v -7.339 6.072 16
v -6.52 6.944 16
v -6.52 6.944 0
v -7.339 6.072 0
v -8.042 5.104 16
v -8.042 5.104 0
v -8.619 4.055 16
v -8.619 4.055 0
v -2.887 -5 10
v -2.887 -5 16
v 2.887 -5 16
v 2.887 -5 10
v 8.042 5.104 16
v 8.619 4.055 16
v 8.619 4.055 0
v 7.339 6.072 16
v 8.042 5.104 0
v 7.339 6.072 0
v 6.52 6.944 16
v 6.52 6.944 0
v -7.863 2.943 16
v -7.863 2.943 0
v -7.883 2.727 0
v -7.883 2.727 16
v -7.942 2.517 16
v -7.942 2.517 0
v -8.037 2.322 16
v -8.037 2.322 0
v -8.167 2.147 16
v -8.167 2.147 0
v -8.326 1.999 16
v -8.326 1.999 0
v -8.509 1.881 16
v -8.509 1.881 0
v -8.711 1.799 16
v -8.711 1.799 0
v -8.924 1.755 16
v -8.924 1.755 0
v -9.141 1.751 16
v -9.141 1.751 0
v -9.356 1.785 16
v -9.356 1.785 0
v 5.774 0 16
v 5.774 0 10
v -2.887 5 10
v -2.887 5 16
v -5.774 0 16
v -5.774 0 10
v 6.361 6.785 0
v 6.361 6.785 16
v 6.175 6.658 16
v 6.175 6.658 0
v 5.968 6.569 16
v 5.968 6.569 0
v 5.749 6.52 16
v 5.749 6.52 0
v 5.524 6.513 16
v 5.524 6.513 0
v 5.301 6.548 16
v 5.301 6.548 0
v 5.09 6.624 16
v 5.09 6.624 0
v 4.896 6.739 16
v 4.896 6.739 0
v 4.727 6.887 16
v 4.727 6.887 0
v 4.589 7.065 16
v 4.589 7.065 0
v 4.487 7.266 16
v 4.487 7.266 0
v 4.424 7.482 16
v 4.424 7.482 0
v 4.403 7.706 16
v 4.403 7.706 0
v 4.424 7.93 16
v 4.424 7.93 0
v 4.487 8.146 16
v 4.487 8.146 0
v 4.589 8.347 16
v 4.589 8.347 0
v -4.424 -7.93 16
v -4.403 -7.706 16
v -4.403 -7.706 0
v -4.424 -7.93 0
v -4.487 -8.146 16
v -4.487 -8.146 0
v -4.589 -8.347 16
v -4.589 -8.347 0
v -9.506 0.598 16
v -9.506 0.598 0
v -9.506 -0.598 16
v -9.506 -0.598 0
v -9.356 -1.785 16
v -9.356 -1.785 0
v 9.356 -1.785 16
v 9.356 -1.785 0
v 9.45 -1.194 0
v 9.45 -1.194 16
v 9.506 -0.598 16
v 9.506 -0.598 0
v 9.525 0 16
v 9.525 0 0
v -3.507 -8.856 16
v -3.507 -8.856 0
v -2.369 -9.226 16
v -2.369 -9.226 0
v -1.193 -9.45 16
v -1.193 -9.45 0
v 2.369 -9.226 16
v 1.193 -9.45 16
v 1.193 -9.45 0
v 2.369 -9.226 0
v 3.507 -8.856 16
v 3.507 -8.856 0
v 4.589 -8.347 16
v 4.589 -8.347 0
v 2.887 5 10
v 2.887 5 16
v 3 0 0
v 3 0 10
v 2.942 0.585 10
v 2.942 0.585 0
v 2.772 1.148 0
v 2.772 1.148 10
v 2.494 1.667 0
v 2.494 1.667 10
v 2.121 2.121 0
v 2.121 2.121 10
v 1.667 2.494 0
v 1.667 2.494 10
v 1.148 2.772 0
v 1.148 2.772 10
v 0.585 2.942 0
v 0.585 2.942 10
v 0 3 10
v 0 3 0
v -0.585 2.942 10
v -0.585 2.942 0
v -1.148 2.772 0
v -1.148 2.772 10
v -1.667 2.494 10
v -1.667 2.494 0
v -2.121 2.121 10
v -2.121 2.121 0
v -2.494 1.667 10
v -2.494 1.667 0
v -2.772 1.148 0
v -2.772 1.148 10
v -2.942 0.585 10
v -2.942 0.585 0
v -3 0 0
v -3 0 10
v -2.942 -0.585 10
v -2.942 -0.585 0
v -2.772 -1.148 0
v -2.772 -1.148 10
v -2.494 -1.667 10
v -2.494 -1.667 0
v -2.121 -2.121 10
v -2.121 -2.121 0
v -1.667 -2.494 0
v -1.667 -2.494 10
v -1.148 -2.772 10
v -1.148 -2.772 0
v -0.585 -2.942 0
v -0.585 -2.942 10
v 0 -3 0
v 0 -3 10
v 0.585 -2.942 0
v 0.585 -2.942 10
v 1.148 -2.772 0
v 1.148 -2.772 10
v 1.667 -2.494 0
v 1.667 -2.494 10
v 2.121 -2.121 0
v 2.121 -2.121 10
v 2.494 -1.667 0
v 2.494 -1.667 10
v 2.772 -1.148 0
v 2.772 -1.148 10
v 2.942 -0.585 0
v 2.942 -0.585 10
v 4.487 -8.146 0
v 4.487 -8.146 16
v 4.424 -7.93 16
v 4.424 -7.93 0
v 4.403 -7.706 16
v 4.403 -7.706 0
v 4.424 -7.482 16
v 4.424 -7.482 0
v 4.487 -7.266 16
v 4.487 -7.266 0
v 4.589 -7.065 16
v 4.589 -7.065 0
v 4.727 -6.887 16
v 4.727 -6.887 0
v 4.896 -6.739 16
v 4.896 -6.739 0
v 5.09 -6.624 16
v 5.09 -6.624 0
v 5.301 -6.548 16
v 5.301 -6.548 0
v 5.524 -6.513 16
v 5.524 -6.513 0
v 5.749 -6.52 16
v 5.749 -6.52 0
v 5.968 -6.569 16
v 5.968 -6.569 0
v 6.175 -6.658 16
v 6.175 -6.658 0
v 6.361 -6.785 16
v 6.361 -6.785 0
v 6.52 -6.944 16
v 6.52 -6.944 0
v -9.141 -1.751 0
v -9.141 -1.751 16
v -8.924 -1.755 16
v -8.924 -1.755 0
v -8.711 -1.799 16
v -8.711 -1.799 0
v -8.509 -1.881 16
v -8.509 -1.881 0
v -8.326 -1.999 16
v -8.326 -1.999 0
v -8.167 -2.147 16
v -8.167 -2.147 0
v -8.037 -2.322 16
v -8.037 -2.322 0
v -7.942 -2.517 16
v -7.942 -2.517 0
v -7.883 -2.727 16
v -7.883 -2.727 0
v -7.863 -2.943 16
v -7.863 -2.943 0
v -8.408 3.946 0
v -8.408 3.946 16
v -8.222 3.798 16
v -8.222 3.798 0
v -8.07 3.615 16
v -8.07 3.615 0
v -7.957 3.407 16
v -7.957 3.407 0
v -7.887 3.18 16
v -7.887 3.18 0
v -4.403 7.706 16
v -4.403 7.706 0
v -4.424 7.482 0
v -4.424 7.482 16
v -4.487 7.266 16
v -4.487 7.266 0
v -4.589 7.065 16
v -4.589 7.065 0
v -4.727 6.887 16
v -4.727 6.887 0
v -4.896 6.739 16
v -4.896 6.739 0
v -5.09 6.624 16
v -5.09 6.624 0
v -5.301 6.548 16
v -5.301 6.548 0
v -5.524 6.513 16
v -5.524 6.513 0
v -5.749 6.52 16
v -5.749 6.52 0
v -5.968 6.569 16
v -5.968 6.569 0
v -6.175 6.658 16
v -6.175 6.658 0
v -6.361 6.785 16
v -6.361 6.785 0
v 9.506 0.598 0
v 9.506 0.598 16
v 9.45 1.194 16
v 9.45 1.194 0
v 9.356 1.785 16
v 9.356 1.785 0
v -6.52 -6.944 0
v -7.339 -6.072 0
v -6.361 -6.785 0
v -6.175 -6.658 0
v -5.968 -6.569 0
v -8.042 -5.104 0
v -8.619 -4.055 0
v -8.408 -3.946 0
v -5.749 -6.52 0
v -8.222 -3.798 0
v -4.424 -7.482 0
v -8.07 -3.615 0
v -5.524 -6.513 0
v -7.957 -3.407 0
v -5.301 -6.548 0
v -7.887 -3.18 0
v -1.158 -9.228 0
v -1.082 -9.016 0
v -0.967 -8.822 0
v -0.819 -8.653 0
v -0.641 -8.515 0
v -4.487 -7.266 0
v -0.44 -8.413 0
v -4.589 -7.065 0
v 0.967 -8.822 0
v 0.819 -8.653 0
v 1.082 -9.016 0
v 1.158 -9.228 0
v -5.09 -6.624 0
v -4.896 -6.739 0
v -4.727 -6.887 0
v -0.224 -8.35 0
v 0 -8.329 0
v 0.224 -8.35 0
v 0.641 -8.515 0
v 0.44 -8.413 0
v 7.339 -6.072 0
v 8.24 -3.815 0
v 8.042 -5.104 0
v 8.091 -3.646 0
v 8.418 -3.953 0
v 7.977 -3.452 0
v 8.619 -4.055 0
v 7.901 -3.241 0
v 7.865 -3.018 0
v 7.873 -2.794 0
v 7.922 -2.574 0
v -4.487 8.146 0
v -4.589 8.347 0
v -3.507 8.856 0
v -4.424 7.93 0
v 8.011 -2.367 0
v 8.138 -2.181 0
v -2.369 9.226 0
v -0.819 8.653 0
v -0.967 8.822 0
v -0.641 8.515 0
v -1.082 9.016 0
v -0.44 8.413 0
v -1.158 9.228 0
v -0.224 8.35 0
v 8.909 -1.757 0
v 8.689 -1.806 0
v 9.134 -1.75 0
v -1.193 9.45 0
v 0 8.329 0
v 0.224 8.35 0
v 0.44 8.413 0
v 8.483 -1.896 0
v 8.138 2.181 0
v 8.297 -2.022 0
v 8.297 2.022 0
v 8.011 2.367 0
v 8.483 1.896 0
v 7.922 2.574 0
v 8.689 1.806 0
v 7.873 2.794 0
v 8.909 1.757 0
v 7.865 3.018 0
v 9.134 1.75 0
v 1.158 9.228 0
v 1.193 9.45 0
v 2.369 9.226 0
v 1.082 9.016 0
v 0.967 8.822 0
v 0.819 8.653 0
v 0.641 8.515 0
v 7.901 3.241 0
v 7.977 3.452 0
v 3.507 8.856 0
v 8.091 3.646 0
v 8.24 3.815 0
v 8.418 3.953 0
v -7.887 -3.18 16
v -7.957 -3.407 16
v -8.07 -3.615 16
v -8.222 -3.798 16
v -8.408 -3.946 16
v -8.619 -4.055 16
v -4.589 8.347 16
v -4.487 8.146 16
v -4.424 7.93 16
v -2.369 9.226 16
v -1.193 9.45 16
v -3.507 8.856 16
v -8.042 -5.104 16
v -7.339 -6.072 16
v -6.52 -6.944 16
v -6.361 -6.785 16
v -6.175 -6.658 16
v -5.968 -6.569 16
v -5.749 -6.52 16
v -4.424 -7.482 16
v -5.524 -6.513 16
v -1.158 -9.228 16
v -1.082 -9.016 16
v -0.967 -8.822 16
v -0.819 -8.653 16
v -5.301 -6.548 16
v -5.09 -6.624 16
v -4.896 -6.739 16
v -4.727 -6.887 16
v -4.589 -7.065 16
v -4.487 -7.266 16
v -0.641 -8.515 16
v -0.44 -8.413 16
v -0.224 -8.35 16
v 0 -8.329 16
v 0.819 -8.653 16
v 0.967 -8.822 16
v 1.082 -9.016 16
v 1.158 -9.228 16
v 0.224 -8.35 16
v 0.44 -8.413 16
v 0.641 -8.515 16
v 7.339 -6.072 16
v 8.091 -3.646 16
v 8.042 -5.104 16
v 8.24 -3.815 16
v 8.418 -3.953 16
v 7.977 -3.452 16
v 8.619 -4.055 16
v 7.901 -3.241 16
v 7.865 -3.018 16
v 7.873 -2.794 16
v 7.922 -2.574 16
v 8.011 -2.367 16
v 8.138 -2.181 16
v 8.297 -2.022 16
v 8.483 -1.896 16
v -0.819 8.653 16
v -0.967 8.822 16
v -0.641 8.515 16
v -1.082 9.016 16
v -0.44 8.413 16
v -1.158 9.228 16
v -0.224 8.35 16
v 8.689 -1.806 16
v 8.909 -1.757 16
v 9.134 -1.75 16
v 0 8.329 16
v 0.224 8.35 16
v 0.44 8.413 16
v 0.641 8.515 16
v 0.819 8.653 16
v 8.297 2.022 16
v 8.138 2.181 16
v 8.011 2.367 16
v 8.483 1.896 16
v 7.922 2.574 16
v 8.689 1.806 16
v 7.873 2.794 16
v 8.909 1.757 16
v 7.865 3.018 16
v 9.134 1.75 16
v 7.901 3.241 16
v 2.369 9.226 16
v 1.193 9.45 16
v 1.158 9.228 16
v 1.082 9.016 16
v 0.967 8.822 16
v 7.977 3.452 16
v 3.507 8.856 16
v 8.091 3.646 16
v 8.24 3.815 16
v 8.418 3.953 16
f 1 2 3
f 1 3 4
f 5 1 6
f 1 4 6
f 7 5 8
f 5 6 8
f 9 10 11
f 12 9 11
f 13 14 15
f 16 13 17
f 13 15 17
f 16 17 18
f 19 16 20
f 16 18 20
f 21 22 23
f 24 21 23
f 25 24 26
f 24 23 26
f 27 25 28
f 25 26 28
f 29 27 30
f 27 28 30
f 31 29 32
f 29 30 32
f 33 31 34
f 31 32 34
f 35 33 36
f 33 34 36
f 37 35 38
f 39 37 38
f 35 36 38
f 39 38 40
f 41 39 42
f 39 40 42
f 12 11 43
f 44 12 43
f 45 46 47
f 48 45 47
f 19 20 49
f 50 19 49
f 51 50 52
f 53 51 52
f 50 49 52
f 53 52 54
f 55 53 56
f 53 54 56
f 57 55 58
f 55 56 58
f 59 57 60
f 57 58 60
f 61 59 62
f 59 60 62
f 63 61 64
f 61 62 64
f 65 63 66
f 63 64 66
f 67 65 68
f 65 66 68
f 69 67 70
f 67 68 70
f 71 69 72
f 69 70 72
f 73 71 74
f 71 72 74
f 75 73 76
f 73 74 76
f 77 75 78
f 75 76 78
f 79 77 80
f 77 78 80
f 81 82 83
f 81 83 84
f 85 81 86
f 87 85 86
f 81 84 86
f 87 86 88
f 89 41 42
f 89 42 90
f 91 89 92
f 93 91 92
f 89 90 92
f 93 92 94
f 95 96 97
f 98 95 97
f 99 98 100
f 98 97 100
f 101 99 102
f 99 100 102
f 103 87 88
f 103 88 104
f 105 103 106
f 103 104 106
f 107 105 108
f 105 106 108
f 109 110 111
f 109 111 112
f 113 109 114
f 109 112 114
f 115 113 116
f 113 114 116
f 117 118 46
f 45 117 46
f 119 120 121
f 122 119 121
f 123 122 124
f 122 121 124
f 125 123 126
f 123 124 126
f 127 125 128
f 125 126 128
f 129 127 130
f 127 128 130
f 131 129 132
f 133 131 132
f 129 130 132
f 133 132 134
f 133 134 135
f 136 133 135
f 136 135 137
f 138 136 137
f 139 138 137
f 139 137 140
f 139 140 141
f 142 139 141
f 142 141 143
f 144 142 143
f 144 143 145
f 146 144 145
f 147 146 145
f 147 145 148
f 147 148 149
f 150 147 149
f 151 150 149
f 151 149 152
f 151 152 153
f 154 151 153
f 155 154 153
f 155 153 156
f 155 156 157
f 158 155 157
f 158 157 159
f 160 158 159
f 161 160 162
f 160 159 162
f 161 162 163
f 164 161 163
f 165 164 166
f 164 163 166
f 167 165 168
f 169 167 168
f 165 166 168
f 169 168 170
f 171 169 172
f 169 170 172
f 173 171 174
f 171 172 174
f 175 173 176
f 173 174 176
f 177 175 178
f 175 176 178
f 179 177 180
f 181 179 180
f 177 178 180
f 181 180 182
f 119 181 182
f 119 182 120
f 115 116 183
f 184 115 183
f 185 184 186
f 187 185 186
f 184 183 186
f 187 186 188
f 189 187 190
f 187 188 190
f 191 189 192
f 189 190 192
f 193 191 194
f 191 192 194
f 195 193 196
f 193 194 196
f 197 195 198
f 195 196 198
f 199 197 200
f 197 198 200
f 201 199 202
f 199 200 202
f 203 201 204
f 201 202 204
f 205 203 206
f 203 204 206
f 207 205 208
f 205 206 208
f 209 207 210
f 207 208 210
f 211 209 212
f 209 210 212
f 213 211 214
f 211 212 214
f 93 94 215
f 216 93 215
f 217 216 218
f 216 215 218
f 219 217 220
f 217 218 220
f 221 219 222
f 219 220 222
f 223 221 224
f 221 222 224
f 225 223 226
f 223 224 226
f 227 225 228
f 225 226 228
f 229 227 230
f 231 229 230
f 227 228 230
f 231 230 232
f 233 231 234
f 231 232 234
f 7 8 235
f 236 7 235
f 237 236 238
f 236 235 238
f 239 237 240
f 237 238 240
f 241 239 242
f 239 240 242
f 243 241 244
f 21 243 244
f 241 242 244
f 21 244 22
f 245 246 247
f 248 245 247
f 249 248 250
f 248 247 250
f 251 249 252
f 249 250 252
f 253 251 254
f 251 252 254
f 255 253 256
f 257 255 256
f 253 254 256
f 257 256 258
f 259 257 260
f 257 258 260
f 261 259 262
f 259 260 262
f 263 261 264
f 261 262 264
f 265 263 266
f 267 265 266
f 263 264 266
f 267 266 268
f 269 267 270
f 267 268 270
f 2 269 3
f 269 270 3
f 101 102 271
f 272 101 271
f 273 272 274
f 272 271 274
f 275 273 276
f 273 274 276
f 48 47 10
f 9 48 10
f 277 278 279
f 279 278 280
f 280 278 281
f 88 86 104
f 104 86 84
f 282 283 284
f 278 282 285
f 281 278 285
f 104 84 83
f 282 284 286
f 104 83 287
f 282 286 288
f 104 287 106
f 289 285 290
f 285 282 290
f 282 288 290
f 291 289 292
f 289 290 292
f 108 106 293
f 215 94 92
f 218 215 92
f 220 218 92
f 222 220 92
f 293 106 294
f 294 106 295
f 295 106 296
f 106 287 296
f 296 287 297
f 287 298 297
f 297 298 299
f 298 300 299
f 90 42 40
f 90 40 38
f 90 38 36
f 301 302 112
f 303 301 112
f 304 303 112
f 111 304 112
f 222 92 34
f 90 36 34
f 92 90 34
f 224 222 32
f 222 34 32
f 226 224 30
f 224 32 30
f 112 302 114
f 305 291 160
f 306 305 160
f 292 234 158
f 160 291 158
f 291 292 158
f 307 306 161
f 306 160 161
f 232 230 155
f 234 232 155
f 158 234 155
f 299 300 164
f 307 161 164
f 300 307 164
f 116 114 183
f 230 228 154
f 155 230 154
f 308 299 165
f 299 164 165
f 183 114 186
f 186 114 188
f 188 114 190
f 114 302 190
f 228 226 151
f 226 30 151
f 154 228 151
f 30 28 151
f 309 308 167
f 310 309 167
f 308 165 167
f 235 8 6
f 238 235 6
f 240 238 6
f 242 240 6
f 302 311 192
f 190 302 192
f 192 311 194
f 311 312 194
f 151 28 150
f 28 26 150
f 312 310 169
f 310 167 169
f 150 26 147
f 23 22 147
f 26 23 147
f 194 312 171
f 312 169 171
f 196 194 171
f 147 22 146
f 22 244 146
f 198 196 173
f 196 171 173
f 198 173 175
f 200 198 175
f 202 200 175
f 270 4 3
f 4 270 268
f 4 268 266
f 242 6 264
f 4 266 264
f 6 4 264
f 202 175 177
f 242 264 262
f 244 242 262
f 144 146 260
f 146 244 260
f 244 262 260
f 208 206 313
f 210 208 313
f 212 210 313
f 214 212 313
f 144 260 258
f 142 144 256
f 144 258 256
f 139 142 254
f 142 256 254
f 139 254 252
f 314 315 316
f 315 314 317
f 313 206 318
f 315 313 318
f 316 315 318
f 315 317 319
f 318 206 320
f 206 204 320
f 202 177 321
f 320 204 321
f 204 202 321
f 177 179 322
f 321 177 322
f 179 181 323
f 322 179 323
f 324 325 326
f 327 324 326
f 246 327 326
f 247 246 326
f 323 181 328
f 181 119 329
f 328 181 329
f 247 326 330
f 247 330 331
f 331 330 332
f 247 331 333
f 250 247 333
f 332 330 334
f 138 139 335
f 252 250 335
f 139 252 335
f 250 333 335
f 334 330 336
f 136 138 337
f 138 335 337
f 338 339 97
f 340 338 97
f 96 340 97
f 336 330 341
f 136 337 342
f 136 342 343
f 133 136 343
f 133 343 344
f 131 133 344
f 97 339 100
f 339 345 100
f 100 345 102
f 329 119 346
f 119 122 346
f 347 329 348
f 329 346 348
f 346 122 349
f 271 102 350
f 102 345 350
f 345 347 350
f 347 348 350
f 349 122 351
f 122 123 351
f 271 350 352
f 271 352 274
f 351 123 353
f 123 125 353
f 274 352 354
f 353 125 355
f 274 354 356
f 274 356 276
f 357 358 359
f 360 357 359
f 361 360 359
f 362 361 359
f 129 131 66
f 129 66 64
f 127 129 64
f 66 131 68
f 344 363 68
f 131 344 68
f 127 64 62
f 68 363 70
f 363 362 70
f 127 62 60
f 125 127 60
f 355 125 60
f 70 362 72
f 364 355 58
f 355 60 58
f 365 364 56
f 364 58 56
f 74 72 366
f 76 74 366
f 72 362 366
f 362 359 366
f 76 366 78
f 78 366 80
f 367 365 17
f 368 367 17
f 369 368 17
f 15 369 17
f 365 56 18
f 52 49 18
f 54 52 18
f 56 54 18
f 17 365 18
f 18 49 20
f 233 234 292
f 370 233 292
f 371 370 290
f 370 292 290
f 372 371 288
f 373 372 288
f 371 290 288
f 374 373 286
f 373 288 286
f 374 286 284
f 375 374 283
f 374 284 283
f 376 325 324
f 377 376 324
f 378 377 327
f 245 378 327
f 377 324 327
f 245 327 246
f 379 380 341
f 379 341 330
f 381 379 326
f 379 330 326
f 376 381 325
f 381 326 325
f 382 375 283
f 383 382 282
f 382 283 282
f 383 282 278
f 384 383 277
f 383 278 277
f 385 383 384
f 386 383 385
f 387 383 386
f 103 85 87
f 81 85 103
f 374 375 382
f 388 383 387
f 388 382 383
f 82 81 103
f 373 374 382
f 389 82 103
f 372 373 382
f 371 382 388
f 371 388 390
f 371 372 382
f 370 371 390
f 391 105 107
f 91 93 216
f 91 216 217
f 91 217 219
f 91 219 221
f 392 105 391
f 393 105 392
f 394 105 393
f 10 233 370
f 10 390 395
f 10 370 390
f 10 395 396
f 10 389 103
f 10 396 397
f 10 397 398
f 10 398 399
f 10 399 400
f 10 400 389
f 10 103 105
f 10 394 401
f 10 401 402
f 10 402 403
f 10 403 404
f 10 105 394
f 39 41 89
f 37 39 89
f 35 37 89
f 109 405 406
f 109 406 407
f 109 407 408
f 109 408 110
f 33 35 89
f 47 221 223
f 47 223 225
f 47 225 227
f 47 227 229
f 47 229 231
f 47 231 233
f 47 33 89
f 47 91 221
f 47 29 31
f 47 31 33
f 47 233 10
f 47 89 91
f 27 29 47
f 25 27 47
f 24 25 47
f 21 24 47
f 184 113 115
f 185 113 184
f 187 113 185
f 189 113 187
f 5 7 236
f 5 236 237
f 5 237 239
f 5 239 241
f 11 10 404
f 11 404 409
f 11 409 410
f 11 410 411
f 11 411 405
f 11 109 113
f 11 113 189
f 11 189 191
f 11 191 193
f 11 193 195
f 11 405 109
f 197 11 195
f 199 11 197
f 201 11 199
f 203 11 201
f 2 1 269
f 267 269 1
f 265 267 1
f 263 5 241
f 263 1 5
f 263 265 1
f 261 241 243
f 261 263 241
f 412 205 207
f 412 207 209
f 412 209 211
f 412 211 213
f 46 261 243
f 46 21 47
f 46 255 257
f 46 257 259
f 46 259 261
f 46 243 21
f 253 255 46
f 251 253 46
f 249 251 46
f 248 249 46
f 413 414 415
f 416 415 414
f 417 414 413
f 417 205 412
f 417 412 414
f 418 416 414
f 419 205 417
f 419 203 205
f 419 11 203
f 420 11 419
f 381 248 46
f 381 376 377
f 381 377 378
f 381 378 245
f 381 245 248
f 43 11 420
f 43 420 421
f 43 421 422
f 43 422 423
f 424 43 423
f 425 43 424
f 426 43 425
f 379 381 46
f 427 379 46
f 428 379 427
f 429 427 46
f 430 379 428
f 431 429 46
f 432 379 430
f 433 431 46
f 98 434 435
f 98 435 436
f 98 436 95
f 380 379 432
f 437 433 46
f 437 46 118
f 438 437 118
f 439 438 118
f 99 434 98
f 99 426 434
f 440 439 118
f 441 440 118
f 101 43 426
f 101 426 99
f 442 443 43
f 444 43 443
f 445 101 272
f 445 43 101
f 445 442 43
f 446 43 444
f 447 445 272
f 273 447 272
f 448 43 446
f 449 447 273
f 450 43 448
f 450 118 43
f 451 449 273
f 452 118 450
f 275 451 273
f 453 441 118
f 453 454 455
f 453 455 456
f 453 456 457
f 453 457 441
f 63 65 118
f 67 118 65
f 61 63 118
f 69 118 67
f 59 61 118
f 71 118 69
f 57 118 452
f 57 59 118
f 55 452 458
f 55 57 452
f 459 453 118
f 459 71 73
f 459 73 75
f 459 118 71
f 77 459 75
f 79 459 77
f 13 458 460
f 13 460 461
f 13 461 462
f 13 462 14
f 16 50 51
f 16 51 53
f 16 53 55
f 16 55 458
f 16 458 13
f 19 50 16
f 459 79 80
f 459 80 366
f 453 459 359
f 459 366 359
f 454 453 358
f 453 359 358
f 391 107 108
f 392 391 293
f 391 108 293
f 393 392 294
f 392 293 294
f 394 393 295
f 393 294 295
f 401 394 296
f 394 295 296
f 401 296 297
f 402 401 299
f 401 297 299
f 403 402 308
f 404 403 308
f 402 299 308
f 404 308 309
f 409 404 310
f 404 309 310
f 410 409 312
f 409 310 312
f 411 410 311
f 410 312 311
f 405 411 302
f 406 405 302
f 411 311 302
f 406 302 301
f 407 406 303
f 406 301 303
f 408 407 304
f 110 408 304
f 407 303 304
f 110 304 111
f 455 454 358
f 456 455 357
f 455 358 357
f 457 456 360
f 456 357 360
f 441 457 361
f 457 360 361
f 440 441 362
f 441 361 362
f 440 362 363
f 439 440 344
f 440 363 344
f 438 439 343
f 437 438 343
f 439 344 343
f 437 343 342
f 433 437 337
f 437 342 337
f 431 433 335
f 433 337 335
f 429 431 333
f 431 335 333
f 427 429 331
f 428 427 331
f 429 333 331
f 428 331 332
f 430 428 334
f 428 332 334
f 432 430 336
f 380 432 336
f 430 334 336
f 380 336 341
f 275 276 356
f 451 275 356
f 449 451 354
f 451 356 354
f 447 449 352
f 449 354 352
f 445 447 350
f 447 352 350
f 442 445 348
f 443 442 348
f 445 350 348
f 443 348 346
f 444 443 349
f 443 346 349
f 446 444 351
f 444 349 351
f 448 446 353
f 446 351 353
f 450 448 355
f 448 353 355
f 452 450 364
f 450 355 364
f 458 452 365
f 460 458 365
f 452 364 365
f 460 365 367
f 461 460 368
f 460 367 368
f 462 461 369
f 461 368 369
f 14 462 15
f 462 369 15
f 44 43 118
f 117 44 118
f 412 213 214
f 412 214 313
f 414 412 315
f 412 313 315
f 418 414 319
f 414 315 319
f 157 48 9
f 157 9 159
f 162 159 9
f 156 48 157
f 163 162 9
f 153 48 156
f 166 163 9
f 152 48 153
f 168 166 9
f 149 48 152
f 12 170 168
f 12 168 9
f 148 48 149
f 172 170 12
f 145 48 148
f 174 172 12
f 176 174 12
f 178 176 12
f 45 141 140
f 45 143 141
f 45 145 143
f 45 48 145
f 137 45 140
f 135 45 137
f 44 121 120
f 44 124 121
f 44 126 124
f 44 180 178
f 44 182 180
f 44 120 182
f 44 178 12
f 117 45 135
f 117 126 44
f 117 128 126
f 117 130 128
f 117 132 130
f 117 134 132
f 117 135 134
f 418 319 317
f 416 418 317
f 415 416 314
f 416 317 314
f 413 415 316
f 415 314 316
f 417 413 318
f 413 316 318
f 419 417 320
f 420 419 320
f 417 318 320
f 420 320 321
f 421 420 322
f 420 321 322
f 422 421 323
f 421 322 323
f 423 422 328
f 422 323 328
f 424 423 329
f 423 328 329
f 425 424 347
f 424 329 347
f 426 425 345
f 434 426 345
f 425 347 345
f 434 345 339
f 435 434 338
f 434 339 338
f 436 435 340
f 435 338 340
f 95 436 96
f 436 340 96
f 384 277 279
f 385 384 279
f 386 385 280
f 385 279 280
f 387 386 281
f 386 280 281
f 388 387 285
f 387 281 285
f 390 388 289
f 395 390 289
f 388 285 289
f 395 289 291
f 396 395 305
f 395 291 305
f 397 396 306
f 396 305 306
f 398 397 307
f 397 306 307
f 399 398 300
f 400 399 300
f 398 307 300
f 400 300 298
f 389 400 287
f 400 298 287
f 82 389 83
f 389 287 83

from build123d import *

# Parameters (mm, degrees)
F1_DEPTH = 16
F2_R     = 3
F3_DEPTH = 16.001
F4_R     = 3
F5_DEPTH = 6


with BuildPart() as f1:
    # F0 (on Top) → F1 (new body)
    with BuildSketch(Plane.XY):
        with BuildLine():
            ThreePointArc((9.3561974046, -1.7852717232), (9.4827054494, -0.8966171761), (9.525, 0))
            ThreePointArc((9.525, 0), (9.4827054494, 0.8966171761), (9.3561974046, 1.7852717232))
            ThreePointArc((9.3561974046, 1.7852717232), (7.9216471704, 2.5738991923), (8.6186790933, 4.0551196883))
            ThreePointArc((8.6186790933, 4.0551196883), (7.7058868714, 5.5986545281), (6.5199663128, 6.9437500156))
            ThreePointArc((6.5199663128, 6.9437500156), (4.8958471982, 6.738555569), (4.5891183065, 8.3465932074))
            ThreePointArc((4.5891183065, 8.3465932074), (2.9433868714, 9.0588133177), (1.193329695, 9.4499518115))
            ThreePointArc((1.193329695, 9.4499518115), (0, 8.3293127534), (-1.193329695, 9.4499518115))
            ThreePointArc((-1.193329695, 9.4499518115), (-2.9433868714, 9.0588133177), (-4.5891183065, 8.3465932074))
            ThreePointArc((-4.5891183065, 8.3465932074), (-4.4504477573, 8.039487236), (-4.4029672815, 7.7058868714))
            ThreePointArc((-4.4029672815, 7.7058868714), (-5.1936438859, 6.5808827064), (-6.5199663128, 6.9437500156))
            ThreePointArc((-6.5199663128, 6.9437500156), (-7.7058868714, 5.5986545281), (-8.6186790933, 4.0551196883))
            ThreePointArc((-8.6186790933, 4.0551196883), (-8.0698919683, 3.6154750772), (-7.8631260711, 2.9433868714))
            ThreePointArc((-7.8631260711, 2.9433868714), (-8.3259799016, 1.9985995007), (-9.3561974046, 1.7852717232))
            ThreePointArc((-9.3561974046, 1.7852717232), (-9.525, 0), (-9.3561974046, -1.7852717232))
            ThreePointArc((-9.3561974046, -1.7852717232), (-8.3259799016, -1.9985995007), (-7.8631260711, -2.9433868714))
            ThreePointArc((-7.8631260711, -2.9433868714), (-8.0698919683, -3.6154750772), (-8.6186790933, -4.0551196883))
            ThreePointArc((-8.6186790933, -4.0551196883), (-7.7058868714, -5.5986545281), (-6.5199663128, -6.9437500156))
            ThreePointArc((-6.5199663128, -6.9437500156), (-5.1936438859, -6.5808827064), (-4.4029672815, -7.7058868714))
            ThreePointArc((-4.4029672815, -7.7058868714), (-4.4504477573, -8.039487236), (-4.5891183065, -8.3465932074))
            ThreePointArc((-4.5891183065, -8.3465932074), (-2.9433868714, -9.0588133177), (-1.193329695, -9.4499518115))
            ThreePointArc((-1.193329695, -9.4499518115), (0, -8.3293127534), (1.193329695, -9.4499518115))
            ThreePointArc((1.193329695, -9.4499518115), (2.9433868714, -9.0588133177), (4.5891183065, -8.3465932074))
            ThreePointArc((4.5891183065, -8.3465932074), (4.8958471982, -6.738555569), (6.5199663128, -6.9437500156))
            ThreePointArc((6.5199663128, -6.9437500156), (7.7058868714, -5.5986545281), (8.6186790933, -4.0551196883))
            ThreePointArc((8.6186790933, -4.0551196883), (7.9216471704, -2.5738991923), (9.3561974046, -1.7852717232))
        make_face()
    extrude(amount=F1_DEPTH)

    # F2 (on face) → F3 (cut, through all)
    with BuildSketch(Plane.XY.offset(16)):
        Circle(F2_R)
    extrude(amount=-F3_DEPTH, mode=Mode.SUBTRACT)

    # F4 (on face) → F5 (cut)
    with BuildSketch(Plane.XY.offset(16)):
        Polygon((2.8867513459, -5), (5.7735026919, 0), (2.8867513459, 5), (-2.8867513459, 5), (-5.7735026919, 0), (-2.8867513459, -5), align=None)
        Circle(F4_R, mode=Mode.SUBTRACT)
    extrude(amount=-F5_DEPTH, mode=Mode.SUBTRACT)


solid = f1.part
